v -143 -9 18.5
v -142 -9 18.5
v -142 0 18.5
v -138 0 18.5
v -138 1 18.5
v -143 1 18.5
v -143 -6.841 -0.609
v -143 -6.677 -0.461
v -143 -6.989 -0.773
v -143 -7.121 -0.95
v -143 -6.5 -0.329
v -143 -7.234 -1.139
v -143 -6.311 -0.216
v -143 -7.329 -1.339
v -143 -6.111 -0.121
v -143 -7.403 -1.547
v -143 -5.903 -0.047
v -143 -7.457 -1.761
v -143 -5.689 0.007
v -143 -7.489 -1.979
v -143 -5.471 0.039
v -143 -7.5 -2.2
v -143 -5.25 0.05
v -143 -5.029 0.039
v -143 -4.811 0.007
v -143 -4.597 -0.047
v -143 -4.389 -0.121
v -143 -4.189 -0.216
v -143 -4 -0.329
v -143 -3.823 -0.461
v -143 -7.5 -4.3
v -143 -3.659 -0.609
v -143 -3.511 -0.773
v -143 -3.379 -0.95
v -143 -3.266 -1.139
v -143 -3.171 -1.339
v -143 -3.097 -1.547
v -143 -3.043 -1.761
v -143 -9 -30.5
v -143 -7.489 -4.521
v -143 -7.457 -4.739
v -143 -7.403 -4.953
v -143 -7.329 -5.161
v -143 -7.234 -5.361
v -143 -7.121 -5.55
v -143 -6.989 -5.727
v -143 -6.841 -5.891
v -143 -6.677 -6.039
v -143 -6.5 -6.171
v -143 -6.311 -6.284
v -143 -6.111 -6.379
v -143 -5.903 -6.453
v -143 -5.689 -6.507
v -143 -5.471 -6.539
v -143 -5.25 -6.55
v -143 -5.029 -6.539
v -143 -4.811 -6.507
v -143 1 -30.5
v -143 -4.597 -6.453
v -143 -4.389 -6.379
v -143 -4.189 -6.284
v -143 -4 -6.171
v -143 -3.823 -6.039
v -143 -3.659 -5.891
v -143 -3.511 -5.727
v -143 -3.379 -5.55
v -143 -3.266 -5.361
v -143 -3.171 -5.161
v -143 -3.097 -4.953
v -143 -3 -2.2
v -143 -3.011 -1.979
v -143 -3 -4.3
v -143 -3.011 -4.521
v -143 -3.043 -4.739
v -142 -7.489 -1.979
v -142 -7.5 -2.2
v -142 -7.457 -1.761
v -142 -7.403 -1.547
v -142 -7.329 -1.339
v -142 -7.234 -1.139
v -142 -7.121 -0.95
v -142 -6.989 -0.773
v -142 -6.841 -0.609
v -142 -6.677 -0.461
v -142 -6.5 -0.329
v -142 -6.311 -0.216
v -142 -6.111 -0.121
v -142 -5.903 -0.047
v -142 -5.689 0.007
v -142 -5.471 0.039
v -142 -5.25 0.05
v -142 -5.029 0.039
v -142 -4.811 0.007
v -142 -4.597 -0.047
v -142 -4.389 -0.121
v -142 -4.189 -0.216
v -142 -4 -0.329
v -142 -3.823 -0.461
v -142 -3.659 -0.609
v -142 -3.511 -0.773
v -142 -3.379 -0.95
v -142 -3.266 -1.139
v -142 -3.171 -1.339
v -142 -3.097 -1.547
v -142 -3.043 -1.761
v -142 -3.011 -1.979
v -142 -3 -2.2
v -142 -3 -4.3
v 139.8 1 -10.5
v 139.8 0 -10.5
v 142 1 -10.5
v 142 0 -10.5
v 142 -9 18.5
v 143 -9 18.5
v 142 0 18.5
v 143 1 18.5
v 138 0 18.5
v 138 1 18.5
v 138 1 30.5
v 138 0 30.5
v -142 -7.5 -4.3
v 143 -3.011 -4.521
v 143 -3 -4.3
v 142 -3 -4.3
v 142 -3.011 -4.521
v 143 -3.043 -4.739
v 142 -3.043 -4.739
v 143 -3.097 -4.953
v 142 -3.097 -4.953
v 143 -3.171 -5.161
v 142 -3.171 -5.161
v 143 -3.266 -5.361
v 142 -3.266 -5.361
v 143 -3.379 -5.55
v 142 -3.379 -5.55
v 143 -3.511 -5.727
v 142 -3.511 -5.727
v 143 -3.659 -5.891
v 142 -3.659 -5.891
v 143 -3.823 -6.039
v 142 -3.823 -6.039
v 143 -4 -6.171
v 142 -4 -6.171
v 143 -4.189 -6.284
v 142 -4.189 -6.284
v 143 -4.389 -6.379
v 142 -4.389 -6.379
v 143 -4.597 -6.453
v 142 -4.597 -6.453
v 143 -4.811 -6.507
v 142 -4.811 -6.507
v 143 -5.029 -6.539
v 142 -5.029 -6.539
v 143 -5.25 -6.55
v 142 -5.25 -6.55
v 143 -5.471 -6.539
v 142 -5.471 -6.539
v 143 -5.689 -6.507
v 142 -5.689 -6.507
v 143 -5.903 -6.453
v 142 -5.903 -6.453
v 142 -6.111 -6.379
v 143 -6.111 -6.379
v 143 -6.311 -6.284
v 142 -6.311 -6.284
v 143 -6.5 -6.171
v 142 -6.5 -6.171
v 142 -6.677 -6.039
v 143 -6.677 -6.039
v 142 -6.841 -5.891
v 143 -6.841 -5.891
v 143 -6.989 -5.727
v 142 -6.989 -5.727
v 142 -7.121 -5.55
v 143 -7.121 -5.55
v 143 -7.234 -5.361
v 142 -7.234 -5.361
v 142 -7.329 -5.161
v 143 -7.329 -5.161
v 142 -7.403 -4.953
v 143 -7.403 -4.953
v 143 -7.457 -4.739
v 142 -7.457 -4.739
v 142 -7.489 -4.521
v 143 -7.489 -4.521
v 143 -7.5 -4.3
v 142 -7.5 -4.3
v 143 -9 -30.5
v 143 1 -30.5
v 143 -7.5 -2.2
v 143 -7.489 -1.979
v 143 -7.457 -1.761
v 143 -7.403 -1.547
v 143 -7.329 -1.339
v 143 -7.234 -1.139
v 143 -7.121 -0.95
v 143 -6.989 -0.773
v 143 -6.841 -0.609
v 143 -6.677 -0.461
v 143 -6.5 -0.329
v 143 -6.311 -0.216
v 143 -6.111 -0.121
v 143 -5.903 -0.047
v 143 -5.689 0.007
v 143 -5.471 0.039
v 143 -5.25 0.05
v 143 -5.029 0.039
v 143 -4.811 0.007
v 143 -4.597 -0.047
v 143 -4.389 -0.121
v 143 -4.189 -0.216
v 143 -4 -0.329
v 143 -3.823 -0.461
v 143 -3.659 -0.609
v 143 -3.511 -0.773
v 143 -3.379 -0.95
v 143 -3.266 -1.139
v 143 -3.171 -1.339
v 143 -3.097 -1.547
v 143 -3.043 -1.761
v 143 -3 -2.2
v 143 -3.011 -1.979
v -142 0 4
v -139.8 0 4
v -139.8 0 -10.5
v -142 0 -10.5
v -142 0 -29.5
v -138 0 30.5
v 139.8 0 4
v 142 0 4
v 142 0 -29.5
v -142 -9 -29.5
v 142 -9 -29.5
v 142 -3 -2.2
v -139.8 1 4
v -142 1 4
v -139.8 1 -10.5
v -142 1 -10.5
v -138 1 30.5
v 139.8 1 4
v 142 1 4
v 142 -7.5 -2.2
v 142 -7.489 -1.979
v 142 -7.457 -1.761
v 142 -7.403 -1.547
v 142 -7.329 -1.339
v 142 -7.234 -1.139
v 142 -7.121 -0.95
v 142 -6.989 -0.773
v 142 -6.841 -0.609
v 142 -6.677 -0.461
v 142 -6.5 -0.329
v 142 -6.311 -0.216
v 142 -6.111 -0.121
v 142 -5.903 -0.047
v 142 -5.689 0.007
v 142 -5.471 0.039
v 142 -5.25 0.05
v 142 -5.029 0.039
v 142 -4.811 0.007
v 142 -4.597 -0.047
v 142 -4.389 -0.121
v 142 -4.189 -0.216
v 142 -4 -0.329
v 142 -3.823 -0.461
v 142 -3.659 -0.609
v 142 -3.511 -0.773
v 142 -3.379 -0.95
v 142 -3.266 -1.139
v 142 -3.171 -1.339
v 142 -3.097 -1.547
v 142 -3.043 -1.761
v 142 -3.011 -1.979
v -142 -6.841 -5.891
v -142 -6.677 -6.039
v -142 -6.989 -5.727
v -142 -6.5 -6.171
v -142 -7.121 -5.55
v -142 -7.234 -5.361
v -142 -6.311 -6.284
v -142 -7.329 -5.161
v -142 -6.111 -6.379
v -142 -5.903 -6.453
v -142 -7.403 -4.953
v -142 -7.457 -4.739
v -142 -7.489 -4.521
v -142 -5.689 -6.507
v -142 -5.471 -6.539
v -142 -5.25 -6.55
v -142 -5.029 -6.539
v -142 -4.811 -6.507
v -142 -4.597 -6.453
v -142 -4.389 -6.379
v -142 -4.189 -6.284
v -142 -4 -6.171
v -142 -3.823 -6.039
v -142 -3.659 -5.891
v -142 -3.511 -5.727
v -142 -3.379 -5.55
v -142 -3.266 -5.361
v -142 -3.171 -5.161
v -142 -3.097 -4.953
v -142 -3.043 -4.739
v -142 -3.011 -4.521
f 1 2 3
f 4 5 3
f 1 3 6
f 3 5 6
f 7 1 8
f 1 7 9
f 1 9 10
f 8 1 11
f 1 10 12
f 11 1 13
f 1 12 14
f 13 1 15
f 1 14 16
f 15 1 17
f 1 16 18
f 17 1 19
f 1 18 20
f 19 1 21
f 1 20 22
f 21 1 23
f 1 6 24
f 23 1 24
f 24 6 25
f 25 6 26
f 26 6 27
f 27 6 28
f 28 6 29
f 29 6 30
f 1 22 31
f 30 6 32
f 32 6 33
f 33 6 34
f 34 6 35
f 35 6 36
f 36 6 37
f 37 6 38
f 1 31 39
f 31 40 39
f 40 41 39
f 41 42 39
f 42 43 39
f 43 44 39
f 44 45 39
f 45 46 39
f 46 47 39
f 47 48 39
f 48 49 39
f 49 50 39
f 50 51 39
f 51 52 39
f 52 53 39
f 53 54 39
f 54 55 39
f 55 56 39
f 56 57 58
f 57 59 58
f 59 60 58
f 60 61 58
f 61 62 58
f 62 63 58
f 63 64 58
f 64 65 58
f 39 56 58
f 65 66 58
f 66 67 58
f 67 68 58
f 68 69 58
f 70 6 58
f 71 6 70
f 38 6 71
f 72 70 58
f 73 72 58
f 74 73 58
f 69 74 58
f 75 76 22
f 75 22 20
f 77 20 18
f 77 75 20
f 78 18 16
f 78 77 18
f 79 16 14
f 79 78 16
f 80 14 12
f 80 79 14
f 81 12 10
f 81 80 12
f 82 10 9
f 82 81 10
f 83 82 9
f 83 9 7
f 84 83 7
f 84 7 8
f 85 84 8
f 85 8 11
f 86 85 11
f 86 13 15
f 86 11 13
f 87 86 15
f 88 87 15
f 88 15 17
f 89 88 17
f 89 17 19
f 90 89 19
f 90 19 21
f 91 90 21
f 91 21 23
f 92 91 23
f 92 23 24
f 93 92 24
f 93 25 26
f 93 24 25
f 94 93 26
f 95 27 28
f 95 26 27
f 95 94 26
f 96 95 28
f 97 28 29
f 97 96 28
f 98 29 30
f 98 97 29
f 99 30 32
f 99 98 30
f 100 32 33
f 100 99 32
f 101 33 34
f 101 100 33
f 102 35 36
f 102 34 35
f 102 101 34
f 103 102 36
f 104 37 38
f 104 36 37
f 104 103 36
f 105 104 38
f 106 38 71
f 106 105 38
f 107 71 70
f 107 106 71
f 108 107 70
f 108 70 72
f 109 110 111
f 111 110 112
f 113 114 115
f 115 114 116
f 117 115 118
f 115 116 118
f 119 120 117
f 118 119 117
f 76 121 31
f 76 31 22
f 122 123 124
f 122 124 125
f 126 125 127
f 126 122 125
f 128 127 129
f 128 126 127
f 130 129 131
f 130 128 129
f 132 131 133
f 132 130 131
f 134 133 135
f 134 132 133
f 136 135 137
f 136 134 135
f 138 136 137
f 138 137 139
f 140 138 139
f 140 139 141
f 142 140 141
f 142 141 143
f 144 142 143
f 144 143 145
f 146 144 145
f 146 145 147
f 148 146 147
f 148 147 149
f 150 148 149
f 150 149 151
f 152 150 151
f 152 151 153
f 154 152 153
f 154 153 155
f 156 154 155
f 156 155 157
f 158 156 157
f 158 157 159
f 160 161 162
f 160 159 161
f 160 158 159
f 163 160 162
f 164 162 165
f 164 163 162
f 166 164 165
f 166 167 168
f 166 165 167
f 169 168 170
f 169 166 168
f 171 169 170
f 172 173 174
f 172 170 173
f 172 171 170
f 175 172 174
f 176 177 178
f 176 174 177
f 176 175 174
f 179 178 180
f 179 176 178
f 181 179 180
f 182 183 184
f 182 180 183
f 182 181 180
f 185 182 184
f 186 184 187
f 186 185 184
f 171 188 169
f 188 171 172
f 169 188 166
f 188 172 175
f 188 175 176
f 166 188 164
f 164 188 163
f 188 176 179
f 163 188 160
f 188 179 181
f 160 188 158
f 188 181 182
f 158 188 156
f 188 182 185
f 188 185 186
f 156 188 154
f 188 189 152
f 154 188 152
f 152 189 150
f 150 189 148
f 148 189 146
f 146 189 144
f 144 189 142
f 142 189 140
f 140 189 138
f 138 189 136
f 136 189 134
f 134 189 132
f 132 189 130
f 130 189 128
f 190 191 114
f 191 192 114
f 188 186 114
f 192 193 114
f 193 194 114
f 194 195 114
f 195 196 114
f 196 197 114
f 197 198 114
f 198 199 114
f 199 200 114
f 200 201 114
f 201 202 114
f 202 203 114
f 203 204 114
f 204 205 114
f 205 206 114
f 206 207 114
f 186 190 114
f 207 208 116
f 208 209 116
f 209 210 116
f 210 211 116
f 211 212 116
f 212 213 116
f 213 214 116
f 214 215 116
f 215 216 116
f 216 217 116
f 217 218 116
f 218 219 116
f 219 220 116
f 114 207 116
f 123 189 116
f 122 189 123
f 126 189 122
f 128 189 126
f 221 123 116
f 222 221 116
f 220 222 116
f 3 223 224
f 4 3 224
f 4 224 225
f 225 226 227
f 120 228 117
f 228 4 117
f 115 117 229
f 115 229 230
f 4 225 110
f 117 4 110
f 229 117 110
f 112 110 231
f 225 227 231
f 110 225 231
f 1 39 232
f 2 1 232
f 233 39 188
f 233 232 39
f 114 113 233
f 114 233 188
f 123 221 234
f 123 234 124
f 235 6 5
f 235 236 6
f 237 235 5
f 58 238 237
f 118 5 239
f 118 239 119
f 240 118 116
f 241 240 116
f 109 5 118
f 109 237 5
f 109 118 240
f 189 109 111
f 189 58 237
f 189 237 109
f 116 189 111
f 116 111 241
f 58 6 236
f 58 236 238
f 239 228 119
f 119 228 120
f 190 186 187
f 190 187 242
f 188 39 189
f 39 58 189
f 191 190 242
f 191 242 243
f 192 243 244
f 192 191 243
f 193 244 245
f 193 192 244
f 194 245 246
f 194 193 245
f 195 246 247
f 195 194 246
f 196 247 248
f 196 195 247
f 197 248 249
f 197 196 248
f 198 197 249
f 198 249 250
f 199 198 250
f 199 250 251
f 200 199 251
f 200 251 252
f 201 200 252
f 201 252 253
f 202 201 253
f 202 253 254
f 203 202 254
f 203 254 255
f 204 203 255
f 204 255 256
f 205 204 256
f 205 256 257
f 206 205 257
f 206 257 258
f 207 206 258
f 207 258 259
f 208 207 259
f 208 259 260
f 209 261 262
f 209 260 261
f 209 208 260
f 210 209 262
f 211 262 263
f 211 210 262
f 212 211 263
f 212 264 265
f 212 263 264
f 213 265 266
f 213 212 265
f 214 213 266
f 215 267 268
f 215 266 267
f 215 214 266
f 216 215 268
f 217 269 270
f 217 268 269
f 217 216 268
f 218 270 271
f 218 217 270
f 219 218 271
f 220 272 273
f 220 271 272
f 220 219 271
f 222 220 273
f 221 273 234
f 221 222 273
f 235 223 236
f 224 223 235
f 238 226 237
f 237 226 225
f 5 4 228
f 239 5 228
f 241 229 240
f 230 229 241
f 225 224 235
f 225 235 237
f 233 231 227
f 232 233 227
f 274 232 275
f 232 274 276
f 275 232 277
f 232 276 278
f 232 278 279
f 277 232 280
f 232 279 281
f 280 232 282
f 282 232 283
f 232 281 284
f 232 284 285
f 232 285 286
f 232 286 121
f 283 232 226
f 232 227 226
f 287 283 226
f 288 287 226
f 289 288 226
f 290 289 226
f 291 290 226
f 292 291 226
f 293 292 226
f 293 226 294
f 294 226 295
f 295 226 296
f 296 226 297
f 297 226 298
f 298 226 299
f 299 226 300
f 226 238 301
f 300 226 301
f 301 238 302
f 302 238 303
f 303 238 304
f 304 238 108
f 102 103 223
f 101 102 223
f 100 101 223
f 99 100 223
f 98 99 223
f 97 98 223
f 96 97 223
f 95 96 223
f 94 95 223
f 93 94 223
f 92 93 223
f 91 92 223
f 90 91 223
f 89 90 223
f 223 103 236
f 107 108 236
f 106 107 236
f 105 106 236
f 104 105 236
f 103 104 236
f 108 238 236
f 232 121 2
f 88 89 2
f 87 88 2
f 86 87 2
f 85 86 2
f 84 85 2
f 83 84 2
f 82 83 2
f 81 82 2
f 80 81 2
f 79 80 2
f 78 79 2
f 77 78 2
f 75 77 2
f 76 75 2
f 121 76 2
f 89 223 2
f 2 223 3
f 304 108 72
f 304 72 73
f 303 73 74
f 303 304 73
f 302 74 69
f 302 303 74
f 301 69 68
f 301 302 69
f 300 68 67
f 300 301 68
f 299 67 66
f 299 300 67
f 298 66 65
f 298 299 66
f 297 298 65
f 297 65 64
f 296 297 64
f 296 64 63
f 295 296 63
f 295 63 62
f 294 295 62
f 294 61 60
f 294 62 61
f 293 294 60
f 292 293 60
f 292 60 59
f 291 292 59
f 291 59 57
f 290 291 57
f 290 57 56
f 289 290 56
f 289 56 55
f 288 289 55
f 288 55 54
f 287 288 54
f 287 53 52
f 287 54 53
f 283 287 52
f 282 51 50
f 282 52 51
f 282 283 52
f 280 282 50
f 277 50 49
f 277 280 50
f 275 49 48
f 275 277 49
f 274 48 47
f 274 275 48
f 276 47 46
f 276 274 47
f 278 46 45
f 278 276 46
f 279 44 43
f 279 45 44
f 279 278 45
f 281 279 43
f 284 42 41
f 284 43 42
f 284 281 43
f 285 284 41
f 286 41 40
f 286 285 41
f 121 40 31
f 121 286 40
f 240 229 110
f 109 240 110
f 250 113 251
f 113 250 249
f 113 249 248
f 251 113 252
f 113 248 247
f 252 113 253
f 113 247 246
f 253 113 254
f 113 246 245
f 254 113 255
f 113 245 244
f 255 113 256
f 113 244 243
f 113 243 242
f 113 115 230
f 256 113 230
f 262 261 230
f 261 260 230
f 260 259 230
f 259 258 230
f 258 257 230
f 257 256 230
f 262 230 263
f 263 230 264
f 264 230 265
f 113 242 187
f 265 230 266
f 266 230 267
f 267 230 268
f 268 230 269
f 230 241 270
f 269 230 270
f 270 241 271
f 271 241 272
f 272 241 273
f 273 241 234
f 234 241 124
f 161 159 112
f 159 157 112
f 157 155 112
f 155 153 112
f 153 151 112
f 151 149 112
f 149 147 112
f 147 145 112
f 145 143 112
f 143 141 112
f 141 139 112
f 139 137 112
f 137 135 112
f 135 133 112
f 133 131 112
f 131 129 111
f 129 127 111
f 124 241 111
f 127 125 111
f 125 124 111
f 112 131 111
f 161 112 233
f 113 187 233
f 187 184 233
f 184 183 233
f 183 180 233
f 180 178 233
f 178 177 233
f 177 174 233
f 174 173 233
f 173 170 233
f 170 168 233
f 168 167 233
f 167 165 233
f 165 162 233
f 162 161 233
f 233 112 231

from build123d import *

# Parameters (mm, degrees)
SKETCH_1_W          = 2.2
SKETCH_1_H          = 14.5
EXTRUDE_1_DEPTH     = 1
EXTRUDE_2_DEPTH     = 9
CUT_EXTRUDE_1_DEPTH = 288.762488869


with BuildPart() as part:
    # Эскиз1 → Бобышка-Вытянуть1 (new body)
    with BuildSketch(Plane(origin=(0, 0, 0), x_dir=(1, 0, 0), z_dir=(0, 1, 0))):
        Polygon((138, -30.5), (138, -18.5), (143, -18.5), (143, 30.5), (-143, 30.5), (-143, -18.5), (-138, -18.5), (-138, -30.5), align=None)
        with Locations((140.9, 3.25)):
            Rectangle(SKETCH_1_W, SKETCH_1_H, mode=Mode.SUBTRACT)
        with Locations((-140.9, 3.25)):
            Rectangle(SKETCH_1_W, SKETCH_1_H, mode=Mode.SUBTRACT)
    extrude(amount=EXTRUDE_1_DEPTH)

    # Эскиз2 → Бобышка-Вытянуть2 (add)
    with BuildSketch(Plane.XZ):
        Polygon((-143, 18.5), (-143, -30.5), (143, -30.5), (143, 18.5), (142, 18.5), (142, -29.5), (-142, -29.5), (-142, 18.5), align=None)
    extrude(amount=EXTRUDE_2_DEPTH)

    # Эскиз3 → Вырез-Вытянуть1 (cut, through all)
    with BuildSketch(Plane(origin=(143, 0, 0), x_dir=(0, 0, -1), z_dir=(1, 0, 0))):
        with BuildLine():
            Line((2.2, -3), (4.3, -3))
            ThreePointArc((4.3, -3), (6.55, -5.25), (4.3, -7.5))
            Line((4.3, -7.5), (2.2, -7.5))
            ThreePointArc((2.2, -7.5), (-0.05, -5.25), (2.2, -3))
        make_face()
    extrude(amount=-CUT_EXTRUDE_1_DEPTH, mode=Mode.SUBTRACT)


solid = part.part
